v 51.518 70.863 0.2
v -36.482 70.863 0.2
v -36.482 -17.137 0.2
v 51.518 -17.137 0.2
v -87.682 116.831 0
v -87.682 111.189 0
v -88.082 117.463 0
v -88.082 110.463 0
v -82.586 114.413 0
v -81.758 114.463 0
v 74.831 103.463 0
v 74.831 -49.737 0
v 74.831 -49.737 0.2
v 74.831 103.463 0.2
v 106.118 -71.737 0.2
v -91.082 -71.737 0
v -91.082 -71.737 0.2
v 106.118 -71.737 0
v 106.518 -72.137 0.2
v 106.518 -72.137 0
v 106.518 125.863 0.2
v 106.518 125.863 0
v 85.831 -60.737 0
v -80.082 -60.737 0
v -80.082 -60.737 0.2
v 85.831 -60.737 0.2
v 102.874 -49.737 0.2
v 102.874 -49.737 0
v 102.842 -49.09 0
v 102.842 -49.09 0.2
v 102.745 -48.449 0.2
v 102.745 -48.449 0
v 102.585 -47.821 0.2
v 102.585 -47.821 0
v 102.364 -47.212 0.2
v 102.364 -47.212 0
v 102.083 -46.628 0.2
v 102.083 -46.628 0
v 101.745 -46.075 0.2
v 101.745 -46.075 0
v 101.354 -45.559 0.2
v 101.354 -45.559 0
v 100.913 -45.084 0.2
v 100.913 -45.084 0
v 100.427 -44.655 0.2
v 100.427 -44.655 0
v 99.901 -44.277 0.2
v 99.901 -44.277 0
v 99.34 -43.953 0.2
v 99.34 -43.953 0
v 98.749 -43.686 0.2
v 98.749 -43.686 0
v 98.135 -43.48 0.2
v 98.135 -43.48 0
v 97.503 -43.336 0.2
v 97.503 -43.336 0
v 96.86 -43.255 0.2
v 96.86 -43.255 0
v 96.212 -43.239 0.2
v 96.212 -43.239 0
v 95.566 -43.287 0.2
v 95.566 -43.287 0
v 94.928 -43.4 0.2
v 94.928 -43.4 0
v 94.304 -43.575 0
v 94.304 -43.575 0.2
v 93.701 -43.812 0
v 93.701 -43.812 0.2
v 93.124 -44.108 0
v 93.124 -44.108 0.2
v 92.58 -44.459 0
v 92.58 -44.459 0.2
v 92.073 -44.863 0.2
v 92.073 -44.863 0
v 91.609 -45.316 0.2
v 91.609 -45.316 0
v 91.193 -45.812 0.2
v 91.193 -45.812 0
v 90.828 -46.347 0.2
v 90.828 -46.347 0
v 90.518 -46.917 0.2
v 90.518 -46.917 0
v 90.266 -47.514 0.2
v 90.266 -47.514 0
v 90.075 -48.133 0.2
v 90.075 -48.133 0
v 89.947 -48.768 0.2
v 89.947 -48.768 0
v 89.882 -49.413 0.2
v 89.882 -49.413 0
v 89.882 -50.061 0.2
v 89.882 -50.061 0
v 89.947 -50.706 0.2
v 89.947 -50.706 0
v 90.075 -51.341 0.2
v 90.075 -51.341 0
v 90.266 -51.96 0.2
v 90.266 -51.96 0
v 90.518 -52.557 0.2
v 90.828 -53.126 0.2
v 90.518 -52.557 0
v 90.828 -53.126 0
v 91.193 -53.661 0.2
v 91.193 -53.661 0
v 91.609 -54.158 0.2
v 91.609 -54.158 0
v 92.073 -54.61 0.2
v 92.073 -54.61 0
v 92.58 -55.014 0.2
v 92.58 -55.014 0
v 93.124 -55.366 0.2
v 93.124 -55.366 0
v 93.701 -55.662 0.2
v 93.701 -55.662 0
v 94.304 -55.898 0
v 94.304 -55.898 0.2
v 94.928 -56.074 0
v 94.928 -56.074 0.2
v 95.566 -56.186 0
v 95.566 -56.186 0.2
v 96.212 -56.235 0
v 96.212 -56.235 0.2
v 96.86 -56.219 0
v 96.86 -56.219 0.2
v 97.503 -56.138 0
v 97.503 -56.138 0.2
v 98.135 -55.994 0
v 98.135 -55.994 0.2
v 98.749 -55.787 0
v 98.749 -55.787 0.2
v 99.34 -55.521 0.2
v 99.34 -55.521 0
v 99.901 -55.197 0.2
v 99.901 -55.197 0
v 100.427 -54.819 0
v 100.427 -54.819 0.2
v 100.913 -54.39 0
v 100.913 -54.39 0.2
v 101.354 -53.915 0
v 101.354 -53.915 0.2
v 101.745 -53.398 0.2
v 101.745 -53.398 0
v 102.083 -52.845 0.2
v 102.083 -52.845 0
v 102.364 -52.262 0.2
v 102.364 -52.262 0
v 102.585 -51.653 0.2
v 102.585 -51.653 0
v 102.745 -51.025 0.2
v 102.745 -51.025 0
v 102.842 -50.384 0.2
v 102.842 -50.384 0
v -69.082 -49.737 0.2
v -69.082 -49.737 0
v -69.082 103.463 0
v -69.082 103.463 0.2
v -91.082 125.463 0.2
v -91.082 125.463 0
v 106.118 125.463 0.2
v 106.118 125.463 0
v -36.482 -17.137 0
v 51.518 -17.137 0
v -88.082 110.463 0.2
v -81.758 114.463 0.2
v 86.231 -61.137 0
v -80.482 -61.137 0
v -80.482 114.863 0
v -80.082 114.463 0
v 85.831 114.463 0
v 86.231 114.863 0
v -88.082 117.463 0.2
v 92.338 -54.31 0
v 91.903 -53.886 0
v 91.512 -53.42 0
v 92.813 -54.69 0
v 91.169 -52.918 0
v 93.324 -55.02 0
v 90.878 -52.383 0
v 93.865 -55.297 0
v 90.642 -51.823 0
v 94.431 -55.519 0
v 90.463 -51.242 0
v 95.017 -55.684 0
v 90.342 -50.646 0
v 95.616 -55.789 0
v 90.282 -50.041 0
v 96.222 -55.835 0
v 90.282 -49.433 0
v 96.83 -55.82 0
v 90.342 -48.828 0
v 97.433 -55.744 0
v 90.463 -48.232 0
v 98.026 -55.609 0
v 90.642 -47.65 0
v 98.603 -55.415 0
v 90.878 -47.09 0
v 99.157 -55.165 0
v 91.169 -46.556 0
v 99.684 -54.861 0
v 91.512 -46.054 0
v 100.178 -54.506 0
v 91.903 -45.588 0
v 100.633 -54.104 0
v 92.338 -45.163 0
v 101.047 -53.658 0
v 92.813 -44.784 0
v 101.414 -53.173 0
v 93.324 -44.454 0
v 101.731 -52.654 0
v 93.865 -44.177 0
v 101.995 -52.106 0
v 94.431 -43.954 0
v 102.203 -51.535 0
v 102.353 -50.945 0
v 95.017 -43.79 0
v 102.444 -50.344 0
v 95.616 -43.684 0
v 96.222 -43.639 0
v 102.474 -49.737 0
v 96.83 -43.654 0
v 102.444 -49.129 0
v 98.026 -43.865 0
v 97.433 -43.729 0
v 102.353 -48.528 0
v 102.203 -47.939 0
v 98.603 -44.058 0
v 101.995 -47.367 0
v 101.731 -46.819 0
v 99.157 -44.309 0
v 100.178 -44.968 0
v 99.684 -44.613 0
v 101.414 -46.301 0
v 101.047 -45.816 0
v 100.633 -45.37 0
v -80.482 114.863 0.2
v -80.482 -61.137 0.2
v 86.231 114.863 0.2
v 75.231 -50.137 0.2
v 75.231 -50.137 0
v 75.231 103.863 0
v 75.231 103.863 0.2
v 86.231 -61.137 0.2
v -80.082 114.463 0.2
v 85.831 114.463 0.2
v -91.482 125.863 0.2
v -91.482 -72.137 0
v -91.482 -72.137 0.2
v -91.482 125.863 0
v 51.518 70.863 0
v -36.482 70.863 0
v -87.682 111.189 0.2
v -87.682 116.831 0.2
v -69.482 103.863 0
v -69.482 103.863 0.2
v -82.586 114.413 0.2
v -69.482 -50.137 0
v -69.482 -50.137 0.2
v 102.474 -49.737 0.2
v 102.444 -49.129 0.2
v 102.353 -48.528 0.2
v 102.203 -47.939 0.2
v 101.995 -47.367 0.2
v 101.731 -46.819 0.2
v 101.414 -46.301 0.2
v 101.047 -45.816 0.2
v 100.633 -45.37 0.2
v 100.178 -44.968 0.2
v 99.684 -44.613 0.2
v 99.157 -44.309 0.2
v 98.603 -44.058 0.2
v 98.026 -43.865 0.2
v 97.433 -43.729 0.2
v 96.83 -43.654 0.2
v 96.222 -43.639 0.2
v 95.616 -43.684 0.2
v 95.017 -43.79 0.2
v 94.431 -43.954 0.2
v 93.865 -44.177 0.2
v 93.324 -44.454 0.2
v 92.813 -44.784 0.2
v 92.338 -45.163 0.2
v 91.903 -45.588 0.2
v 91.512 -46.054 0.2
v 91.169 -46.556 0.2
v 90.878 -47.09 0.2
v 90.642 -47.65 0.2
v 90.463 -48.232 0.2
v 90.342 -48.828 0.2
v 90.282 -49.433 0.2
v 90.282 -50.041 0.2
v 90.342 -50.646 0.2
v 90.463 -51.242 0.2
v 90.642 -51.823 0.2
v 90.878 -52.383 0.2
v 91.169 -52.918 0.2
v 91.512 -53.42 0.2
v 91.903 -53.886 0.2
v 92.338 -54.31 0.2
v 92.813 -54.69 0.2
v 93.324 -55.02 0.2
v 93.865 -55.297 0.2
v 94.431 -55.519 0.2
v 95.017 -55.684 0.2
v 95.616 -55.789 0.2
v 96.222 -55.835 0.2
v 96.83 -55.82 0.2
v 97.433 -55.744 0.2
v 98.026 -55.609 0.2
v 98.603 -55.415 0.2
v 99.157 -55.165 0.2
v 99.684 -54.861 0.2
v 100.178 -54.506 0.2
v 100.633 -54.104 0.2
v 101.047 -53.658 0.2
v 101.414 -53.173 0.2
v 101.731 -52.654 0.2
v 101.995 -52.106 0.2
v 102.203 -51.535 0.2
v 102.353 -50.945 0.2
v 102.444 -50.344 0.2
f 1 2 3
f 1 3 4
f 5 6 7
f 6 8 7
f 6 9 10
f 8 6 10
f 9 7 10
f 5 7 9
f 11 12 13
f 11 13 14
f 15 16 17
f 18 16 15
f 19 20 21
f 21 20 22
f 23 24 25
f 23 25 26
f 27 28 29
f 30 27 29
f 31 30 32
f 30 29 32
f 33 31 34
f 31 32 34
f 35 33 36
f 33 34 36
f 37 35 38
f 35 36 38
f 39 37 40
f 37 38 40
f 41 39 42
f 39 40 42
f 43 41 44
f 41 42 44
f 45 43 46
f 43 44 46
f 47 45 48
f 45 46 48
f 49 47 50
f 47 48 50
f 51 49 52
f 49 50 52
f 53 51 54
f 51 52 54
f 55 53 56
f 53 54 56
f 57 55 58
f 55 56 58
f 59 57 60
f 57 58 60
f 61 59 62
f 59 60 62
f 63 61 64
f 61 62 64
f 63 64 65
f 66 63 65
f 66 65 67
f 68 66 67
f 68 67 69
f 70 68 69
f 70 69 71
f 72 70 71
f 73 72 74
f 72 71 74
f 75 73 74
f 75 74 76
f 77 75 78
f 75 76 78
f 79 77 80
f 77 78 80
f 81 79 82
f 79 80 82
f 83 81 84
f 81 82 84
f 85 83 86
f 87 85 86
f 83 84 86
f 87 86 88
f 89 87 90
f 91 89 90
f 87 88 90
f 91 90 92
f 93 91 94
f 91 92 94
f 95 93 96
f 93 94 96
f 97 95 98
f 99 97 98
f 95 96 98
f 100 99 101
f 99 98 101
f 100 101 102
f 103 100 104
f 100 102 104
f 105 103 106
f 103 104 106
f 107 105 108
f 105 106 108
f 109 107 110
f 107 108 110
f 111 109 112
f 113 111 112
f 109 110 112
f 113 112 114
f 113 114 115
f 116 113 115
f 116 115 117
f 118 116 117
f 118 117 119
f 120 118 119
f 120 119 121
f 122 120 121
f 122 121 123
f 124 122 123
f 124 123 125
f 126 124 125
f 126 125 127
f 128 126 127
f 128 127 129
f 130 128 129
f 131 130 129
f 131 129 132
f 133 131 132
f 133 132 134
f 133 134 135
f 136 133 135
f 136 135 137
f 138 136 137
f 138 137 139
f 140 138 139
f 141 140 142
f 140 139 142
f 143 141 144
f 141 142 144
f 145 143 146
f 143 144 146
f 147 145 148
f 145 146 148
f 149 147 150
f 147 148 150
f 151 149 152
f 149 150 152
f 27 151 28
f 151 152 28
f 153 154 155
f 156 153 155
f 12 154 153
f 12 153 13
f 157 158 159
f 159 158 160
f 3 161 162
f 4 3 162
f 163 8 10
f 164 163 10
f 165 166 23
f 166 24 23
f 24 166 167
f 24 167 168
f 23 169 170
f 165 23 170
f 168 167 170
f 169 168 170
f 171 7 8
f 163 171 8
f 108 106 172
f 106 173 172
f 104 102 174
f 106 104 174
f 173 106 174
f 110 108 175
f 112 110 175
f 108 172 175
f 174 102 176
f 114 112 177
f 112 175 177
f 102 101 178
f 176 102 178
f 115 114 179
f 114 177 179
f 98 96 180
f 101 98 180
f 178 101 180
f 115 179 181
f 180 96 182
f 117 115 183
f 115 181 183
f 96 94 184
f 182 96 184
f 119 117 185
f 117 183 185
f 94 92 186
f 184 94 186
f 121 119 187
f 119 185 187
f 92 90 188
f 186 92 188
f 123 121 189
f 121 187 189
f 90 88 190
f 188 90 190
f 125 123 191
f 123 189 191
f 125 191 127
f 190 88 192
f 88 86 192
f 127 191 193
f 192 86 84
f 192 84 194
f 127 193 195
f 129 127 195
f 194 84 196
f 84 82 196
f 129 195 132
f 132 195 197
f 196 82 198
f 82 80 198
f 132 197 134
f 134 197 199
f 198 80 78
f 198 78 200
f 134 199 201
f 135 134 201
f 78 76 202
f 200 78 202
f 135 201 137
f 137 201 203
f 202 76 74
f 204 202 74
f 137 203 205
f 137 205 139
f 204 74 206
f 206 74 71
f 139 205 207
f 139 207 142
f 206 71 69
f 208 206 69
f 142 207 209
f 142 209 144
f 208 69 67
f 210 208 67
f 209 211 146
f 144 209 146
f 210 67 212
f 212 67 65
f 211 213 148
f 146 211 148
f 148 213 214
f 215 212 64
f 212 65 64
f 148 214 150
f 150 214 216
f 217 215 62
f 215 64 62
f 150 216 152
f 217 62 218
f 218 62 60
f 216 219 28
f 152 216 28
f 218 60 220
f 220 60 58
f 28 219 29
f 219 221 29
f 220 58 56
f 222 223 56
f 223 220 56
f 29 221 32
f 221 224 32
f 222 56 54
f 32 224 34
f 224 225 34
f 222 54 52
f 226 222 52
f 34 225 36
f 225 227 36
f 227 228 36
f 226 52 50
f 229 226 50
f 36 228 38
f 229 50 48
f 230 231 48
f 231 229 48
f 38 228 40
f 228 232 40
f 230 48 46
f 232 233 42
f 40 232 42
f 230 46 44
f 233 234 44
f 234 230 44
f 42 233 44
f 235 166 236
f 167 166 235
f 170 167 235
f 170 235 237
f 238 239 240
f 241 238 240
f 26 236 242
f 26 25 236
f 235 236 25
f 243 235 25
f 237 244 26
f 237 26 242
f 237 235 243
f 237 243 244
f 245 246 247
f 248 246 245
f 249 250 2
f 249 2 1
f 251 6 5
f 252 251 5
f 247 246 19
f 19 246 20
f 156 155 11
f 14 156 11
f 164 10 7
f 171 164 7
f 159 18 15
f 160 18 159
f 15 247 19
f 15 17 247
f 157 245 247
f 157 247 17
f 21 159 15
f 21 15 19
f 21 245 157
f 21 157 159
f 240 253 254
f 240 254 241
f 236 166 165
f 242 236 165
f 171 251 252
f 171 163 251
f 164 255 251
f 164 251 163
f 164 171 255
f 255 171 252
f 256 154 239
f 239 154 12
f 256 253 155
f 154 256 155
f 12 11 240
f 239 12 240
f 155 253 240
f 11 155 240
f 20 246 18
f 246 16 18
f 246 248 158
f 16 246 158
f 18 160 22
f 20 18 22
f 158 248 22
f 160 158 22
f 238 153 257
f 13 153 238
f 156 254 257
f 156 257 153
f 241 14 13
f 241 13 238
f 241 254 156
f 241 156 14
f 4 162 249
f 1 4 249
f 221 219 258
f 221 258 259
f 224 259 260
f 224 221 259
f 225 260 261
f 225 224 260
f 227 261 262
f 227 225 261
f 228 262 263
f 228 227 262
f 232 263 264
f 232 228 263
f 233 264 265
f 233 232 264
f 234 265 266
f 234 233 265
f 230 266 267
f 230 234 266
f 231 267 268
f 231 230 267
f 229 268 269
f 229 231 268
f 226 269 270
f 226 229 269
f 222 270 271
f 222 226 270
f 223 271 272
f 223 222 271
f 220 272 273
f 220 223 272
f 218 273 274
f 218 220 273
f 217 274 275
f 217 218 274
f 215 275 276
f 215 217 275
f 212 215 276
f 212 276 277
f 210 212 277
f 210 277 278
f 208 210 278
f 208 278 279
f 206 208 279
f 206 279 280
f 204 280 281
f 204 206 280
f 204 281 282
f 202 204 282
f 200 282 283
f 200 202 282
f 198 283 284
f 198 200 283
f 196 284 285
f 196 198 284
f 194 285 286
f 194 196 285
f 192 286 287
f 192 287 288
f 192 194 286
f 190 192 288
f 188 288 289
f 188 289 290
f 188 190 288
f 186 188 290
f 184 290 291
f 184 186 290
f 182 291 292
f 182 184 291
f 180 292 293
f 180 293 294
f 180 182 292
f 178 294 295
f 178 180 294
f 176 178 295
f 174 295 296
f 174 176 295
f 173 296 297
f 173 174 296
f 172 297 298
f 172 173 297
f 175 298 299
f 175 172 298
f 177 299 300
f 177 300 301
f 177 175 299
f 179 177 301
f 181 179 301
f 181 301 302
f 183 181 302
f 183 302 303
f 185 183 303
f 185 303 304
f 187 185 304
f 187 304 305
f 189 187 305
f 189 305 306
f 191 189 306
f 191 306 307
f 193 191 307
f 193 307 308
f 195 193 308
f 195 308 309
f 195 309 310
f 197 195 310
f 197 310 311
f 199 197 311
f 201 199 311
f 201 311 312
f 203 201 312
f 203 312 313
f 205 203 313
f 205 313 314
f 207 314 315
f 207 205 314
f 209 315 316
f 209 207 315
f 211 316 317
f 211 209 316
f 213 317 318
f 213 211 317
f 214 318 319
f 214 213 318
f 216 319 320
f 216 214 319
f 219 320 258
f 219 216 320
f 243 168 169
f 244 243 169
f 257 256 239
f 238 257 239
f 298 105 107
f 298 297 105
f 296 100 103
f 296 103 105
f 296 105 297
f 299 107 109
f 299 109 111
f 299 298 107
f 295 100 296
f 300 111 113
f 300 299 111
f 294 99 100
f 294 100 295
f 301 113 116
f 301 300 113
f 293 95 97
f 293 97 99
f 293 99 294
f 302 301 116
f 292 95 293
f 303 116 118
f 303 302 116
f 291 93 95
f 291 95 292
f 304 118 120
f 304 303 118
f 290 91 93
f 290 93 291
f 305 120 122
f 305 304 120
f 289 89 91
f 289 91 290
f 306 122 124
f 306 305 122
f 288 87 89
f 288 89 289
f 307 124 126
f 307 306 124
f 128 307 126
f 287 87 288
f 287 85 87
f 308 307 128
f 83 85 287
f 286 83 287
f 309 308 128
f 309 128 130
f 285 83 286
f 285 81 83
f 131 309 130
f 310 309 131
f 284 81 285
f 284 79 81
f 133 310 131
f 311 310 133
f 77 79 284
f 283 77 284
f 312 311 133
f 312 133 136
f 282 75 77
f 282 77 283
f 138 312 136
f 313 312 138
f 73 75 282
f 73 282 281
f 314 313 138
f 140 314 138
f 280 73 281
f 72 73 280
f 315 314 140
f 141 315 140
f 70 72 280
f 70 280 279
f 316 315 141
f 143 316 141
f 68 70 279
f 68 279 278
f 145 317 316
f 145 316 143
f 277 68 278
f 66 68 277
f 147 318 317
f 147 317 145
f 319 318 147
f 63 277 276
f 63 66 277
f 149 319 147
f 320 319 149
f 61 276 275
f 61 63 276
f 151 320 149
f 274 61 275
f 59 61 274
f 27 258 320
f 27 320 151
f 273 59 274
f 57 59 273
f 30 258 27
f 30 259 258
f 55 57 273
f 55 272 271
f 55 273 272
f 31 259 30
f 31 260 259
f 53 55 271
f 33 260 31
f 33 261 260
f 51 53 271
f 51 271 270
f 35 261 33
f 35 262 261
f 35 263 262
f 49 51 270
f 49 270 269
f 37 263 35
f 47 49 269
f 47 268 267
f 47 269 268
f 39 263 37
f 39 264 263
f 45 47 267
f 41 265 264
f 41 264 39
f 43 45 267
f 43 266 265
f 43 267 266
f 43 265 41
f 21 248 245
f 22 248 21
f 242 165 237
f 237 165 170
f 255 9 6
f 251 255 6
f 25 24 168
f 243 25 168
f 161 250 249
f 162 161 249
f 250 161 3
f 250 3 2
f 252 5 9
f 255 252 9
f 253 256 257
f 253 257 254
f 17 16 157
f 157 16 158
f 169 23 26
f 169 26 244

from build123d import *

# Parameters (mm, degrees)
F1_W     = 198
F1_H     = 198
F1_W_2   = 197.2
F1_H_2   = 197.2
F2_DEPTH = 0.2
F1_W_3   = 166.7133469
F1_H_3   = 176
F1_W_4   = 165.9133469
F1_H_4   = 175.2
F1_W_5   = 144.7133469
F1_H_5   = 154
F1_W_6   = 143.9133469
F1_H_6   = 153.2
F1_R     = 6.5
F1_R_2   = 6.1
F1_W_7   = 88
F1_H_7   = 88


with BuildPart() as f2:
    # F1 (on Top) → F2 (new body)
    with BuildSketch(Plane.XY):
        with Locations((7.5175617039, 26.8632308638)):
            Rectangle(F1_W, F1_H)
        with Locations((7.5175617039, 26.8632308638)):
            Rectangle(F1_W_2, F1_H_2, mode=Mode.SUBTRACT)
    extrude(amount=F2_DEPTH)


with BuildPart() as f2b:
    # F1 (on Top) → F2, piece 2 (new body)
    with BuildSketch(Plane.XY):
        with Locations((2.8742351539, 26.8632308638)):
            Rectangle(F1_W_3, F1_H_3)
        with Locations((2.8742351539, 26.8632308638)):
            Rectangle(F1_W_4, F1_H_4, mode=Mode.SUBTRACT)
    extrude(amount=F2_DEPTH)


with BuildPart() as f2c:
    # F1 (on Top) → F2, piece 3 (new body)
    with BuildSketch(Plane.XY):
        with Locations((2.8742351539, 26.8632308638)):
            Rectangle(F1_W_5, F1_H_5)
        with Locations((2.8742351539, 26.8632308638)):
            Rectangle(F1_W_6, F1_H_6, mode=Mode.SUBTRACT)
    extrude(amount=F2_DEPTH)


with BuildPart() as f2d:
    # F1 (on Top) → F2, piece 4 (new body)
    with BuildSketch(Plane.XY):
        with Locations((96.3742351539, -49.7367691362)):
            Circle(F1_R)
        with Locations((96.3742351539, -49.7367691362)):
            Circle(F1_R_2, mode=Mode.SUBTRACT)
    extrude(amount=F2_DEPTH)


with BuildPart() as f2e:
    # F1 (on Top) → F2, piece 5 (new body)
    with BuildSketch(Plane.XY):
        with Locations((7.5175617039, 26.8632308638)):
            Rectangle(F1_W_7, F1_H_7)
    extrude(amount=F2_DEPTH)


with BuildPart() as f2f:
    # F1 (on Top) → F2, piece 6 (new body)
    with BuildSketch(Plane.XY):
        Polygon((-81.7578829757, 114.4632308638), (-88.0824382961, 117.4632308638), (-88.0824382961, 110.4632308638), align=None)
        Polygon((-87.6824382961, 111.1894994593), (-87.6824382961, 116.8307753318), (-82.5855009628, 114.4130856722), align=None, mode=Mode.SUBTRACT)
    extrude(amount=F2_DEPTH)


solid = Compound([f2.part, f2b.part, f2c.part, f2d.part, f2e.part, f2f.part])
